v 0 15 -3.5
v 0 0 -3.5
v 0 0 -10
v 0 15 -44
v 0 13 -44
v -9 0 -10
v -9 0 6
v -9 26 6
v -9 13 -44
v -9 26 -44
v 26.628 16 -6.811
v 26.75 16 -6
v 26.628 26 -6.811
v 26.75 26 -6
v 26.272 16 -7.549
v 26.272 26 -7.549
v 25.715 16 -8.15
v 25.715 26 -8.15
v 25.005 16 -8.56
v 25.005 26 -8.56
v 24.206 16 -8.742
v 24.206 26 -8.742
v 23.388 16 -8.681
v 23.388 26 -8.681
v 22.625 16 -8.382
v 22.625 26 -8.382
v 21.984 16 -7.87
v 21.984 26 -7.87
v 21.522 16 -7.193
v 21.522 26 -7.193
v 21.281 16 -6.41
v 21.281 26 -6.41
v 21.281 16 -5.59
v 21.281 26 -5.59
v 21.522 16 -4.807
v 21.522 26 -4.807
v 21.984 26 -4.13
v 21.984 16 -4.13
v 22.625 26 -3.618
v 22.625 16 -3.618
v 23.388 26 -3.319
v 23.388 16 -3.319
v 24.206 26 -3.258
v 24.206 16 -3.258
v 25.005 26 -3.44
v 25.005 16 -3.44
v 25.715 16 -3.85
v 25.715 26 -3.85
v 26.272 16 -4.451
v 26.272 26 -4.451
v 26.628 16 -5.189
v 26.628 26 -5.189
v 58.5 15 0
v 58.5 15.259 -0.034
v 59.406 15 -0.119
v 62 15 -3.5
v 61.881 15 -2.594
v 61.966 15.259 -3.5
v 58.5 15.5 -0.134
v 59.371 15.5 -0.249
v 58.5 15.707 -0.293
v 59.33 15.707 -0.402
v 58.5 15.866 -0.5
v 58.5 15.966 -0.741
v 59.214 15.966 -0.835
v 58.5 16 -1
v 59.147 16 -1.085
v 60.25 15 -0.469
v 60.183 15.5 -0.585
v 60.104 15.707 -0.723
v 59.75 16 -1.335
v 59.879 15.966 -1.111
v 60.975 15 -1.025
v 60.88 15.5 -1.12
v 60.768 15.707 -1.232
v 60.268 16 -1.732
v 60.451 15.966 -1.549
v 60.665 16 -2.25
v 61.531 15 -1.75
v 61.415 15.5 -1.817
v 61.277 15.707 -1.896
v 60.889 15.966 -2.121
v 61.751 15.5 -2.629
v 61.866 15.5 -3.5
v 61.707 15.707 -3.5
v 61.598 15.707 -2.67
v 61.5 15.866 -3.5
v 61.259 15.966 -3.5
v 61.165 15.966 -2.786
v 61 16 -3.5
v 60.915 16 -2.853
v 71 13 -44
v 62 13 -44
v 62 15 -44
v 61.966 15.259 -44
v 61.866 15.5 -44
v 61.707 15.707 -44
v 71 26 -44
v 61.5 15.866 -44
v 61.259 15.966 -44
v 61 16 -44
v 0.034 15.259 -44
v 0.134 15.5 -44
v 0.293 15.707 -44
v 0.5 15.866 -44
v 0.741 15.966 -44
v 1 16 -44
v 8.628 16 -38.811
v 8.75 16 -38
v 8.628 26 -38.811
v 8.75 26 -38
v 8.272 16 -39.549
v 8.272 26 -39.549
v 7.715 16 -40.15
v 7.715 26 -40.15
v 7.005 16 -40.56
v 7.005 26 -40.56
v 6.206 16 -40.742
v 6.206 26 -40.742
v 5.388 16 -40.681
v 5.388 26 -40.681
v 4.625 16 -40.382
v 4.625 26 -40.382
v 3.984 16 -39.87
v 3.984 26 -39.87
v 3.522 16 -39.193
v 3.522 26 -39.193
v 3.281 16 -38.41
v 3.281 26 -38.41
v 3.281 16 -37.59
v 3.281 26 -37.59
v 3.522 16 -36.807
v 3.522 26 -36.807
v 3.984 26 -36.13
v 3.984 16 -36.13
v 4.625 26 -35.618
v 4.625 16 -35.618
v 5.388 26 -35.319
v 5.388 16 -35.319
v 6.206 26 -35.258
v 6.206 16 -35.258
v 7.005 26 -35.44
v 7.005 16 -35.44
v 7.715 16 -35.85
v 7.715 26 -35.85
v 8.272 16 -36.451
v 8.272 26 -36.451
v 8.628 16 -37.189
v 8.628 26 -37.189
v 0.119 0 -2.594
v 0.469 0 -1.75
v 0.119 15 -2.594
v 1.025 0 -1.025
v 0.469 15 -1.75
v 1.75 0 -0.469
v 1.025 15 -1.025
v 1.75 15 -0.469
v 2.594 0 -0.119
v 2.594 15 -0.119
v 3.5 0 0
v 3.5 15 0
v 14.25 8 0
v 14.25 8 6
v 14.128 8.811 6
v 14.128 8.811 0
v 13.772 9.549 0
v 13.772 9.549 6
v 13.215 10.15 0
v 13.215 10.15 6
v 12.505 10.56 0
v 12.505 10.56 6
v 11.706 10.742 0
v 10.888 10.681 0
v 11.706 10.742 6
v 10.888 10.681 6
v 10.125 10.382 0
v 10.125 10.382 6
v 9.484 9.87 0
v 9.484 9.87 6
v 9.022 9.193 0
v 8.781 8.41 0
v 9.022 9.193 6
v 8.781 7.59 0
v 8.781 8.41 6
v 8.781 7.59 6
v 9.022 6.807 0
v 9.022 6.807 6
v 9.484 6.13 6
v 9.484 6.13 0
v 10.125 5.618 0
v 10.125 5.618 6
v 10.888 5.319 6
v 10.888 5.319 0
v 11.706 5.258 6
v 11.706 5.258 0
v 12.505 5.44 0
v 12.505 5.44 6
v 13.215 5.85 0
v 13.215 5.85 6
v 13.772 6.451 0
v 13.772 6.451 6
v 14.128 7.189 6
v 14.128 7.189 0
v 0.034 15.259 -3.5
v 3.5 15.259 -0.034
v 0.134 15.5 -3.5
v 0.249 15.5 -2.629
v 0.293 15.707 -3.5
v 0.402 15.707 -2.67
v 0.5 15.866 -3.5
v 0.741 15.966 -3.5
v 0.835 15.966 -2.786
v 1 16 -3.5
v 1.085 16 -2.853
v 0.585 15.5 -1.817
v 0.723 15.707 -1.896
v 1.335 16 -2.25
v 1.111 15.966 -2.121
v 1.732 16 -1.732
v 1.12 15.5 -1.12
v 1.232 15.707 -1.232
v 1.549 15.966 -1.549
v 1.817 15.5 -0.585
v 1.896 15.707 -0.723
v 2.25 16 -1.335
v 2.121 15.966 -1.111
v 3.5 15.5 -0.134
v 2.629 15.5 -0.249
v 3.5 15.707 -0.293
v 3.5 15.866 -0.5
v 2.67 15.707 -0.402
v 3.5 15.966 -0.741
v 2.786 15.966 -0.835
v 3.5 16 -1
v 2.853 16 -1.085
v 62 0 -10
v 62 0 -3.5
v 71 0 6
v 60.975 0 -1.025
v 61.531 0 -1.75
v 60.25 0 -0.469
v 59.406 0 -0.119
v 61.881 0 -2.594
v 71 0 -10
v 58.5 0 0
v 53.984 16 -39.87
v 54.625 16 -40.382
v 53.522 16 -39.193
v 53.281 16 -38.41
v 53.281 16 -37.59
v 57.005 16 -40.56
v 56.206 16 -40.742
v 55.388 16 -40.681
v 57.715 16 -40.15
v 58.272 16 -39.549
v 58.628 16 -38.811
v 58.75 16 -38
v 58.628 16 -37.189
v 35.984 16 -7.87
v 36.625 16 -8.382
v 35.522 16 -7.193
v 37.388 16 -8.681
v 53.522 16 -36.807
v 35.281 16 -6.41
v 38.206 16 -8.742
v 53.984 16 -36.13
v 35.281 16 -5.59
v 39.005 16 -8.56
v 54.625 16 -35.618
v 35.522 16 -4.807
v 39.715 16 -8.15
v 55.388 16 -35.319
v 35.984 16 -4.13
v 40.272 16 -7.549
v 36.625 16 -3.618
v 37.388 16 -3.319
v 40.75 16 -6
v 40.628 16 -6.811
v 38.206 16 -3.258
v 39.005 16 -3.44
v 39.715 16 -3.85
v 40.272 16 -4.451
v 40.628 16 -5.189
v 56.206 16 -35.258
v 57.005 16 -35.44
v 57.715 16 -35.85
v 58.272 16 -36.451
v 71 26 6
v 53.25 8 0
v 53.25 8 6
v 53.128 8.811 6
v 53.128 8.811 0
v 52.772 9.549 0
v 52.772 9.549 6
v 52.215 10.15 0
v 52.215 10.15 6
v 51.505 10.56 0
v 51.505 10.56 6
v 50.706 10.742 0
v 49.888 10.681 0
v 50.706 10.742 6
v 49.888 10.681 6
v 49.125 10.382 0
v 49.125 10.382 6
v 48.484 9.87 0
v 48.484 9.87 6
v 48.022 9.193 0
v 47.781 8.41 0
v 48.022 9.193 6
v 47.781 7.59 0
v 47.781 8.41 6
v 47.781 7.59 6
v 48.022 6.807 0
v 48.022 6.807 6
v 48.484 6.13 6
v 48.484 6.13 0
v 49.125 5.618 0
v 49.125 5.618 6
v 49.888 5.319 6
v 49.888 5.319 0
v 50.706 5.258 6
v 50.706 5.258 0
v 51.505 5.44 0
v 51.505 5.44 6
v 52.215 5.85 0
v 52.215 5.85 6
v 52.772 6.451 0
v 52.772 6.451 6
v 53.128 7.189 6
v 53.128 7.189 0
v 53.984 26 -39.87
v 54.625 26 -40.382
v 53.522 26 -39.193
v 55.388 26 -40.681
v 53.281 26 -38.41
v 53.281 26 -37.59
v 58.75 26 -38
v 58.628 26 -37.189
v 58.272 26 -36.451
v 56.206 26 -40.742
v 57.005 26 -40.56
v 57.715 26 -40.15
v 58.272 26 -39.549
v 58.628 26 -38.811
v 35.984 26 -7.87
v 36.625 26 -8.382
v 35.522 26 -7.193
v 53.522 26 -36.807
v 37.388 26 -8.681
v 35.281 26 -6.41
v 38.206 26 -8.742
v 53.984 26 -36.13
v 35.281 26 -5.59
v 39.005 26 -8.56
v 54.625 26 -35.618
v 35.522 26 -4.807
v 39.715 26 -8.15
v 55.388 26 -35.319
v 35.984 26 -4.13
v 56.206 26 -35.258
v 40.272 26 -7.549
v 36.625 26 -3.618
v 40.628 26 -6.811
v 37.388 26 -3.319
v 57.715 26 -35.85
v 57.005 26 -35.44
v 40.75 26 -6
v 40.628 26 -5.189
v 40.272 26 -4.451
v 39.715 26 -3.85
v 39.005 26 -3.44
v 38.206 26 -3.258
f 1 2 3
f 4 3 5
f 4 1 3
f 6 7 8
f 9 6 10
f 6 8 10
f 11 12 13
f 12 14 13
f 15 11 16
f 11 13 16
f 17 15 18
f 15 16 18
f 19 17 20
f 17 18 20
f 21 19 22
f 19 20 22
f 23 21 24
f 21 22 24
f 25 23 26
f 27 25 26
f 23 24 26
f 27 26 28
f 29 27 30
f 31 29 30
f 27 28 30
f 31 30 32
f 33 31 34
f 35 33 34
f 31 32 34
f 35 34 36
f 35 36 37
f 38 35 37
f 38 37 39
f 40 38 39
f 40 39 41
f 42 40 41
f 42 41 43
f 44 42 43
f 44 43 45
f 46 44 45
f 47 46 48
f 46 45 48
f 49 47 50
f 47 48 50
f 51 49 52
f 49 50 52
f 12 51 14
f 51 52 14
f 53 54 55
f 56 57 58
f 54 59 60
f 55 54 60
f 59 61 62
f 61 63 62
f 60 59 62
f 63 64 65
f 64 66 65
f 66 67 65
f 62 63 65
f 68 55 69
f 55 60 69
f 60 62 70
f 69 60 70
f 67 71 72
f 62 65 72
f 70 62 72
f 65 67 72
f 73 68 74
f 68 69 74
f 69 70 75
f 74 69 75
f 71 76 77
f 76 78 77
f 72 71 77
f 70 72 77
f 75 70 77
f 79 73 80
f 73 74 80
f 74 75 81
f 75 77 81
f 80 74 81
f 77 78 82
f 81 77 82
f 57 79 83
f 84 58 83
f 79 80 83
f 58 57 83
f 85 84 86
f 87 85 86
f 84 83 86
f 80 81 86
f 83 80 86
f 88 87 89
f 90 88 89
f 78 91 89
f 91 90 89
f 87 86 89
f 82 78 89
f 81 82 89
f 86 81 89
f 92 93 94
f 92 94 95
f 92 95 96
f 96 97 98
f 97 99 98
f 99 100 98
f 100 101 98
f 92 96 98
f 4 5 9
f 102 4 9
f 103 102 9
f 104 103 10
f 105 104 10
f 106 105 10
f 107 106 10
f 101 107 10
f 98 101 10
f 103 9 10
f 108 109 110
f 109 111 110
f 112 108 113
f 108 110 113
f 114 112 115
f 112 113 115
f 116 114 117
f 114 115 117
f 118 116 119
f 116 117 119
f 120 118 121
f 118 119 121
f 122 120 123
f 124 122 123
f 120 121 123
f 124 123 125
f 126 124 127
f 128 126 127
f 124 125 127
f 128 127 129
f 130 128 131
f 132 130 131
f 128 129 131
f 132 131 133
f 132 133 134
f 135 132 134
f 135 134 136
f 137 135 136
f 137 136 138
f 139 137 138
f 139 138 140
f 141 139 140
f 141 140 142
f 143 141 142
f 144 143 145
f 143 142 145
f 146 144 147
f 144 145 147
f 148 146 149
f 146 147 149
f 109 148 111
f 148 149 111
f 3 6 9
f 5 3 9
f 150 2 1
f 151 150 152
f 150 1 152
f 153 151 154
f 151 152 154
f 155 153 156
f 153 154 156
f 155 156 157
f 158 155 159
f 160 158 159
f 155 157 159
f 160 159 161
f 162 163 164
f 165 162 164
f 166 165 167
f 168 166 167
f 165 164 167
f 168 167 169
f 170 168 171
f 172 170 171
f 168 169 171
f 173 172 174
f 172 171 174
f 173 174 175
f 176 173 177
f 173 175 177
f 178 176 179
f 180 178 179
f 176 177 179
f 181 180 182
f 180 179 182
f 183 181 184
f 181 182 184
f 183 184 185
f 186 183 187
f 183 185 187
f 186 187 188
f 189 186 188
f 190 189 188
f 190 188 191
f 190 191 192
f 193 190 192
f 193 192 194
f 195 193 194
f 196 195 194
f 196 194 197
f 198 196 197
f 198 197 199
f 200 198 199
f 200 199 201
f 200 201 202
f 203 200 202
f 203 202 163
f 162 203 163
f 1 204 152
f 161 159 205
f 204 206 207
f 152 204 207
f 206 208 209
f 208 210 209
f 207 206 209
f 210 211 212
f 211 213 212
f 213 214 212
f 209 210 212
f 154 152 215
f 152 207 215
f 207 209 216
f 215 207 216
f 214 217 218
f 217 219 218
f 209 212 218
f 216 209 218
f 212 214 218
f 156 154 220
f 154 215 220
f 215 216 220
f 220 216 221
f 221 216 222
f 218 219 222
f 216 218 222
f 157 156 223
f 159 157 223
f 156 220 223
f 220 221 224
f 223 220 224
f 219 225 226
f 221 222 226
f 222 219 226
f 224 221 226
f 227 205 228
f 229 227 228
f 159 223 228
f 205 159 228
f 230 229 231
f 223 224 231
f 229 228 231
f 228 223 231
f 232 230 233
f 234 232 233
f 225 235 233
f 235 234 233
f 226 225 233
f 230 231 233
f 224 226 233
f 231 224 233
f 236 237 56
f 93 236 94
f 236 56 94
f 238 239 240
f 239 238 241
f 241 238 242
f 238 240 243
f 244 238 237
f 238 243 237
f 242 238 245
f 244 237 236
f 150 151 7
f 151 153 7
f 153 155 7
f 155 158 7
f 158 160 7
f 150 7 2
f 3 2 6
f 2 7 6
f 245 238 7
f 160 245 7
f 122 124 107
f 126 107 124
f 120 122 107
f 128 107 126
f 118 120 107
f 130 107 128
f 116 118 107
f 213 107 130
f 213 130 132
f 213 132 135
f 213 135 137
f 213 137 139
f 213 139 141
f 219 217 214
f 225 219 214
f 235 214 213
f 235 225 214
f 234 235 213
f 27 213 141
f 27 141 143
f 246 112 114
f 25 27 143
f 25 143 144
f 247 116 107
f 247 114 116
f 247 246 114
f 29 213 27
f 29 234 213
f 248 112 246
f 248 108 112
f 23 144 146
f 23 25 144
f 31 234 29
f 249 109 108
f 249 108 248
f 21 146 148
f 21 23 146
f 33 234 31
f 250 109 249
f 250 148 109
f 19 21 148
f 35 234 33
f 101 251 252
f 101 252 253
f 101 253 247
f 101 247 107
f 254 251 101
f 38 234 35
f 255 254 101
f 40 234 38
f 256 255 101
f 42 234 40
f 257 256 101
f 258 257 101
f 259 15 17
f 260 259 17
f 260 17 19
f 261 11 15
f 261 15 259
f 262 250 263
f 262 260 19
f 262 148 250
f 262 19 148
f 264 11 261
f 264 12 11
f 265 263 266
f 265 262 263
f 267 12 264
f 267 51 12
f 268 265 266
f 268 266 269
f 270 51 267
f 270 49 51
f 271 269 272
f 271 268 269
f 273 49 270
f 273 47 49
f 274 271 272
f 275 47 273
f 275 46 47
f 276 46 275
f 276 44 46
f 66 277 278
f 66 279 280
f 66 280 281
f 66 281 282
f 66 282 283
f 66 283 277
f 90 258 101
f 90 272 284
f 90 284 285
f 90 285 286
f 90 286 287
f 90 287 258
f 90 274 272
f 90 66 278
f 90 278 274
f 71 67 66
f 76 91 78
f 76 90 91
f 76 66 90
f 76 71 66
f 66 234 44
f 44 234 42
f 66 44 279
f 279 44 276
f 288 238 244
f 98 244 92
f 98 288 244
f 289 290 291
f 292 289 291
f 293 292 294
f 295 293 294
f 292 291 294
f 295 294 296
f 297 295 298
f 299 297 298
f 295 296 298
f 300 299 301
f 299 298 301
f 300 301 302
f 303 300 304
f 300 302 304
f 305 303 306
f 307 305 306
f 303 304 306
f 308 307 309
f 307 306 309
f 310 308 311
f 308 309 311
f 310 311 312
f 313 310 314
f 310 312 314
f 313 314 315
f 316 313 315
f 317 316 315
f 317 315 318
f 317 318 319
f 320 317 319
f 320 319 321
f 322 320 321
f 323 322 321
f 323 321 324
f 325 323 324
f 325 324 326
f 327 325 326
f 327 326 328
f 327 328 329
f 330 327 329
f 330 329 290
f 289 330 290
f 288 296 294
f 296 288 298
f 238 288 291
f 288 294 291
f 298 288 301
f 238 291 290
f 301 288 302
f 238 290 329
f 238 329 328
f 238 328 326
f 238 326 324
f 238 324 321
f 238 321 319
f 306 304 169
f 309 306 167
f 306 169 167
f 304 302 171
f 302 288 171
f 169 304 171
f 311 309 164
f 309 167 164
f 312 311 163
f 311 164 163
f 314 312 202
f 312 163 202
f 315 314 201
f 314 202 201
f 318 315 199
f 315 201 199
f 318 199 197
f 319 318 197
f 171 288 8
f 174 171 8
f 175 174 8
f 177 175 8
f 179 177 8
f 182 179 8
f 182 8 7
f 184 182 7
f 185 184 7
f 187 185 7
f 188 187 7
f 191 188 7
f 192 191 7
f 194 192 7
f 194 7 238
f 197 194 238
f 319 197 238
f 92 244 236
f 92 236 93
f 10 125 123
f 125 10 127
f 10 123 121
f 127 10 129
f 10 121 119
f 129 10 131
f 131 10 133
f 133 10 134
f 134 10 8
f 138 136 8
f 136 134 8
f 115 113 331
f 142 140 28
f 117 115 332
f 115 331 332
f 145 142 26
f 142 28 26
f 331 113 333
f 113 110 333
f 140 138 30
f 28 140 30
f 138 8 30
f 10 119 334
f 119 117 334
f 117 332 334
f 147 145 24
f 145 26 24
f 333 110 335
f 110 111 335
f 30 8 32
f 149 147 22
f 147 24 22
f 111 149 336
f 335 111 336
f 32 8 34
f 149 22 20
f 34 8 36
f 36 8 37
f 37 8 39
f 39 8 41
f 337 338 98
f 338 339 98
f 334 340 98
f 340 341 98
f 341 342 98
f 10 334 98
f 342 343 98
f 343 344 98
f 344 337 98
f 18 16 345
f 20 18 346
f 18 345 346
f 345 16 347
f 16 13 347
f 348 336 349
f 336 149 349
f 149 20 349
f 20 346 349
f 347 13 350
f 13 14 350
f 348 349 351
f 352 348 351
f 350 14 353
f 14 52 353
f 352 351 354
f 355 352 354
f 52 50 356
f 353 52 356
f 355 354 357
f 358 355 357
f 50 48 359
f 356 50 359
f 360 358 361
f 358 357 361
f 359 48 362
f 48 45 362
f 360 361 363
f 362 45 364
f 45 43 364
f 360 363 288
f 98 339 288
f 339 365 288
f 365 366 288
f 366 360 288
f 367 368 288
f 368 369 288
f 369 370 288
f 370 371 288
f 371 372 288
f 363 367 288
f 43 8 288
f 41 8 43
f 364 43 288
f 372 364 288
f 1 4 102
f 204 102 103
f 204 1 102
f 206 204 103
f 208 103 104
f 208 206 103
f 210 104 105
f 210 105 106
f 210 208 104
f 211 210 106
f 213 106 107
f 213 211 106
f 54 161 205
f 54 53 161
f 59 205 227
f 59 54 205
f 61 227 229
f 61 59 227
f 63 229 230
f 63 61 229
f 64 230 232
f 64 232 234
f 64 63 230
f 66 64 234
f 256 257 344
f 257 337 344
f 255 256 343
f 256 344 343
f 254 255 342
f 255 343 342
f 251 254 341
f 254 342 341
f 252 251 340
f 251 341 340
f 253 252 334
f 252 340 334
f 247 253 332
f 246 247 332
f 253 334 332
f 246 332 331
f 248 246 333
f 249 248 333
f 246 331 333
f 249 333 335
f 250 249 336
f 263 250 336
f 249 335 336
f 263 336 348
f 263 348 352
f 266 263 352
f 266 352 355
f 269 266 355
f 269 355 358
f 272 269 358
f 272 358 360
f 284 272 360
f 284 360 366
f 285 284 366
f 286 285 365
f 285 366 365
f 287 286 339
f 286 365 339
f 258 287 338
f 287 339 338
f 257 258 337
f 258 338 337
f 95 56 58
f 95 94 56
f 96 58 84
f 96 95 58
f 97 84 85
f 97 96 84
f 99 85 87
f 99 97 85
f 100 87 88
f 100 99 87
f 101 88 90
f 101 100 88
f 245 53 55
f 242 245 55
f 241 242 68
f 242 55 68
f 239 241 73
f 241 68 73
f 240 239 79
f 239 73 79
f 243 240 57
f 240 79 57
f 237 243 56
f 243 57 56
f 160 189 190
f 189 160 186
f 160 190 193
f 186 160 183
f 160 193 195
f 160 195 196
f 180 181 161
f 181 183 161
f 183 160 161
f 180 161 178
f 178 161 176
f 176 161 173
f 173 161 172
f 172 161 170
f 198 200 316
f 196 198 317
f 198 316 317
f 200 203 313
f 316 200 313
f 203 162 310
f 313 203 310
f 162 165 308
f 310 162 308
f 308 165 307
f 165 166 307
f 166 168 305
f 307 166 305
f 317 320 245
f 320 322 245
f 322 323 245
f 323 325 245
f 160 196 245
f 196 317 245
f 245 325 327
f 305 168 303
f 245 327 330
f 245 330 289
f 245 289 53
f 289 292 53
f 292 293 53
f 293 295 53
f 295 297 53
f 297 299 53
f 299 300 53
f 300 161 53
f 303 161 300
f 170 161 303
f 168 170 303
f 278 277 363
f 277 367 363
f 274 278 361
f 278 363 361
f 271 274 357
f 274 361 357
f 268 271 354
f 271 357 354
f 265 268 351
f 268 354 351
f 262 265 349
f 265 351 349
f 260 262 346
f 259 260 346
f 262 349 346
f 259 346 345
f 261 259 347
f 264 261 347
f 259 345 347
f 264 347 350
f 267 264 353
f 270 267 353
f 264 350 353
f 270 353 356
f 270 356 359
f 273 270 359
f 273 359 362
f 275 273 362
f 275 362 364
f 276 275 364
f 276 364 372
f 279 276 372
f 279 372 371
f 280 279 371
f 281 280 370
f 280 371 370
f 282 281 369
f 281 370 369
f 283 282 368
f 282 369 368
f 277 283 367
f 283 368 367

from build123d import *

# Parameters (mm, degrees)
SKETCH1_W                = 62
SKETCH1_H                = 26
BOSS_EXTRUDE1_DEPTH      = 6
SKETCH2_W                = 80
SKETCH2_H                = 10
BOSS_EXTRUDE2_DEPTH      = 50
M5_CLEARANCE_HOLE1_D     = 5.5
M5_CLEARANCE_HOLE1_DEPTH = 10
M5_CLEARANCE_HOLE1_TIP   = 1.652366702
BOSS_EXTRUDE3_DEPTH      = 9
BOSS_EXTRUDE4_START      = -80
BOSS_EXTRUDE4_DEPTH      = 9
M5_CLEARANCE_HOLE2_D     = 5.5
M5_CLEARANCE_HOLE2_DEPTH = 10
M5_CLEARANCE_HOLE2_TIP   = 1.652366702
FILLET1_R                = 3.5
FILLET2_R                = 1


with BuildPart() as part:
    # Sketch1 → Boss-Extrude1 (new body)
    with BuildSketch(Plane.XY):
        with Locations((31, 13)):
            Rectangle(SKETCH1_W, SKETCH1_H)
    extrude(amount=BOSS_EXTRUDE1_DEPTH)

    # Sketch2 → Boss-Extrude2 (add)
    with BuildSketch(Plane.XY.offset(6)):
        with Locations((31, 21)):
            Rectangle(SKETCH2_W, SKETCH2_H)
    extrude(amount=-BOSS_EXTRUDE2_DEPTH)

    # M5 Clearance Hole1
    with Locations(Plane(origin=(0, 0, 0), x_dir=(-1, 0, 0), z_dir=(0, 0, -1))):
        with Locations((-50.5, 8), (-11.5, 8)):
            Hole(M5_CLEARANCE_HOLE1_D / 2, depth=M5_CLEARANCE_HOLE1_DEPTH)
            with Locations((0, 0, -(M5_CLEARANCE_HOLE1_DEPTH + M5_CLEARANCE_HOLE1_TIP / 2))):  # 118° drill point
                Cone(0, M5_CLEARANCE_HOLE1_D / 2, M5_CLEARANCE_HOLE1_TIP, mode=Mode.SUBTRACT)

    # Sketch5 → Boss-Extrude3 (add)
    with BuildSketch(Plane(origin=(71, 0, 0), x_dir=(0, 0, -1), z_dir=(1, 0, 0))):
        Polygon((-6, 0), (10, 0), (44, 13), (44, 16), (-6, 16), align=None)
    extrude(amount=-BOSS_EXTRUDE3_DEPTH)

    # Sketch5<2> → Boss-Extrude4 (add)
    with BuildSketch(Plane(origin=(71, 0, 0), x_dir=(0, 0, -1), z_dir=(1, 0, 0)).offset(BOSS_EXTRUDE4_START)):
        Polygon((-6, 0), (10, 0), (44, 13), (44, 16), (-6, 16), align=None)
    extrude(amount=BOSS_EXTRUDE4_DEPTH)

    # M5 Clearance Hole2
    with Locations(Plane(origin=(0, 16, 0), x_dir=(-1, 0, 0), z_dir=(0, -1, 0))):
        with Locations((-38, 6), (-24, 6), (-56, 38), (-6, 38)):
            Hole(M5_CLEARANCE_HOLE2_D / 2, depth=M5_CLEARANCE_HOLE2_DEPTH)
            with Locations((0, 0, -(M5_CLEARANCE_HOLE2_DEPTH + M5_CLEARANCE_HOLE2_TIP / 2))):  # 118° drill point
                Cone(0, M5_CLEARANCE_HOLE2_D / 2, M5_CLEARANCE_HOLE2_TIP, mode=Mode.SUBTRACT)

    # Fillet1
    fillet1_edges = [part.edges().sort_by_distance(p)[0] for p in [
        (0, 8, 0),
        (62, 8, 0),
    ]]
    fillet(fillet1_edges, radius=FILLET1_R)

    # Fillet2
    fillet2_edges = [part.edges().sort_by_distance(p)[0] for p in [
        (0, 16, -23.75),
        (31, 16, 0),
        (1.025126266, 16, -1.025126266),
        (60.974873734, 16, -1.025126266),
        (62, 16, -23.75),
    ]]
    fillet(fillet2_edges, radius=FILLET2_R)


solid = part.part
